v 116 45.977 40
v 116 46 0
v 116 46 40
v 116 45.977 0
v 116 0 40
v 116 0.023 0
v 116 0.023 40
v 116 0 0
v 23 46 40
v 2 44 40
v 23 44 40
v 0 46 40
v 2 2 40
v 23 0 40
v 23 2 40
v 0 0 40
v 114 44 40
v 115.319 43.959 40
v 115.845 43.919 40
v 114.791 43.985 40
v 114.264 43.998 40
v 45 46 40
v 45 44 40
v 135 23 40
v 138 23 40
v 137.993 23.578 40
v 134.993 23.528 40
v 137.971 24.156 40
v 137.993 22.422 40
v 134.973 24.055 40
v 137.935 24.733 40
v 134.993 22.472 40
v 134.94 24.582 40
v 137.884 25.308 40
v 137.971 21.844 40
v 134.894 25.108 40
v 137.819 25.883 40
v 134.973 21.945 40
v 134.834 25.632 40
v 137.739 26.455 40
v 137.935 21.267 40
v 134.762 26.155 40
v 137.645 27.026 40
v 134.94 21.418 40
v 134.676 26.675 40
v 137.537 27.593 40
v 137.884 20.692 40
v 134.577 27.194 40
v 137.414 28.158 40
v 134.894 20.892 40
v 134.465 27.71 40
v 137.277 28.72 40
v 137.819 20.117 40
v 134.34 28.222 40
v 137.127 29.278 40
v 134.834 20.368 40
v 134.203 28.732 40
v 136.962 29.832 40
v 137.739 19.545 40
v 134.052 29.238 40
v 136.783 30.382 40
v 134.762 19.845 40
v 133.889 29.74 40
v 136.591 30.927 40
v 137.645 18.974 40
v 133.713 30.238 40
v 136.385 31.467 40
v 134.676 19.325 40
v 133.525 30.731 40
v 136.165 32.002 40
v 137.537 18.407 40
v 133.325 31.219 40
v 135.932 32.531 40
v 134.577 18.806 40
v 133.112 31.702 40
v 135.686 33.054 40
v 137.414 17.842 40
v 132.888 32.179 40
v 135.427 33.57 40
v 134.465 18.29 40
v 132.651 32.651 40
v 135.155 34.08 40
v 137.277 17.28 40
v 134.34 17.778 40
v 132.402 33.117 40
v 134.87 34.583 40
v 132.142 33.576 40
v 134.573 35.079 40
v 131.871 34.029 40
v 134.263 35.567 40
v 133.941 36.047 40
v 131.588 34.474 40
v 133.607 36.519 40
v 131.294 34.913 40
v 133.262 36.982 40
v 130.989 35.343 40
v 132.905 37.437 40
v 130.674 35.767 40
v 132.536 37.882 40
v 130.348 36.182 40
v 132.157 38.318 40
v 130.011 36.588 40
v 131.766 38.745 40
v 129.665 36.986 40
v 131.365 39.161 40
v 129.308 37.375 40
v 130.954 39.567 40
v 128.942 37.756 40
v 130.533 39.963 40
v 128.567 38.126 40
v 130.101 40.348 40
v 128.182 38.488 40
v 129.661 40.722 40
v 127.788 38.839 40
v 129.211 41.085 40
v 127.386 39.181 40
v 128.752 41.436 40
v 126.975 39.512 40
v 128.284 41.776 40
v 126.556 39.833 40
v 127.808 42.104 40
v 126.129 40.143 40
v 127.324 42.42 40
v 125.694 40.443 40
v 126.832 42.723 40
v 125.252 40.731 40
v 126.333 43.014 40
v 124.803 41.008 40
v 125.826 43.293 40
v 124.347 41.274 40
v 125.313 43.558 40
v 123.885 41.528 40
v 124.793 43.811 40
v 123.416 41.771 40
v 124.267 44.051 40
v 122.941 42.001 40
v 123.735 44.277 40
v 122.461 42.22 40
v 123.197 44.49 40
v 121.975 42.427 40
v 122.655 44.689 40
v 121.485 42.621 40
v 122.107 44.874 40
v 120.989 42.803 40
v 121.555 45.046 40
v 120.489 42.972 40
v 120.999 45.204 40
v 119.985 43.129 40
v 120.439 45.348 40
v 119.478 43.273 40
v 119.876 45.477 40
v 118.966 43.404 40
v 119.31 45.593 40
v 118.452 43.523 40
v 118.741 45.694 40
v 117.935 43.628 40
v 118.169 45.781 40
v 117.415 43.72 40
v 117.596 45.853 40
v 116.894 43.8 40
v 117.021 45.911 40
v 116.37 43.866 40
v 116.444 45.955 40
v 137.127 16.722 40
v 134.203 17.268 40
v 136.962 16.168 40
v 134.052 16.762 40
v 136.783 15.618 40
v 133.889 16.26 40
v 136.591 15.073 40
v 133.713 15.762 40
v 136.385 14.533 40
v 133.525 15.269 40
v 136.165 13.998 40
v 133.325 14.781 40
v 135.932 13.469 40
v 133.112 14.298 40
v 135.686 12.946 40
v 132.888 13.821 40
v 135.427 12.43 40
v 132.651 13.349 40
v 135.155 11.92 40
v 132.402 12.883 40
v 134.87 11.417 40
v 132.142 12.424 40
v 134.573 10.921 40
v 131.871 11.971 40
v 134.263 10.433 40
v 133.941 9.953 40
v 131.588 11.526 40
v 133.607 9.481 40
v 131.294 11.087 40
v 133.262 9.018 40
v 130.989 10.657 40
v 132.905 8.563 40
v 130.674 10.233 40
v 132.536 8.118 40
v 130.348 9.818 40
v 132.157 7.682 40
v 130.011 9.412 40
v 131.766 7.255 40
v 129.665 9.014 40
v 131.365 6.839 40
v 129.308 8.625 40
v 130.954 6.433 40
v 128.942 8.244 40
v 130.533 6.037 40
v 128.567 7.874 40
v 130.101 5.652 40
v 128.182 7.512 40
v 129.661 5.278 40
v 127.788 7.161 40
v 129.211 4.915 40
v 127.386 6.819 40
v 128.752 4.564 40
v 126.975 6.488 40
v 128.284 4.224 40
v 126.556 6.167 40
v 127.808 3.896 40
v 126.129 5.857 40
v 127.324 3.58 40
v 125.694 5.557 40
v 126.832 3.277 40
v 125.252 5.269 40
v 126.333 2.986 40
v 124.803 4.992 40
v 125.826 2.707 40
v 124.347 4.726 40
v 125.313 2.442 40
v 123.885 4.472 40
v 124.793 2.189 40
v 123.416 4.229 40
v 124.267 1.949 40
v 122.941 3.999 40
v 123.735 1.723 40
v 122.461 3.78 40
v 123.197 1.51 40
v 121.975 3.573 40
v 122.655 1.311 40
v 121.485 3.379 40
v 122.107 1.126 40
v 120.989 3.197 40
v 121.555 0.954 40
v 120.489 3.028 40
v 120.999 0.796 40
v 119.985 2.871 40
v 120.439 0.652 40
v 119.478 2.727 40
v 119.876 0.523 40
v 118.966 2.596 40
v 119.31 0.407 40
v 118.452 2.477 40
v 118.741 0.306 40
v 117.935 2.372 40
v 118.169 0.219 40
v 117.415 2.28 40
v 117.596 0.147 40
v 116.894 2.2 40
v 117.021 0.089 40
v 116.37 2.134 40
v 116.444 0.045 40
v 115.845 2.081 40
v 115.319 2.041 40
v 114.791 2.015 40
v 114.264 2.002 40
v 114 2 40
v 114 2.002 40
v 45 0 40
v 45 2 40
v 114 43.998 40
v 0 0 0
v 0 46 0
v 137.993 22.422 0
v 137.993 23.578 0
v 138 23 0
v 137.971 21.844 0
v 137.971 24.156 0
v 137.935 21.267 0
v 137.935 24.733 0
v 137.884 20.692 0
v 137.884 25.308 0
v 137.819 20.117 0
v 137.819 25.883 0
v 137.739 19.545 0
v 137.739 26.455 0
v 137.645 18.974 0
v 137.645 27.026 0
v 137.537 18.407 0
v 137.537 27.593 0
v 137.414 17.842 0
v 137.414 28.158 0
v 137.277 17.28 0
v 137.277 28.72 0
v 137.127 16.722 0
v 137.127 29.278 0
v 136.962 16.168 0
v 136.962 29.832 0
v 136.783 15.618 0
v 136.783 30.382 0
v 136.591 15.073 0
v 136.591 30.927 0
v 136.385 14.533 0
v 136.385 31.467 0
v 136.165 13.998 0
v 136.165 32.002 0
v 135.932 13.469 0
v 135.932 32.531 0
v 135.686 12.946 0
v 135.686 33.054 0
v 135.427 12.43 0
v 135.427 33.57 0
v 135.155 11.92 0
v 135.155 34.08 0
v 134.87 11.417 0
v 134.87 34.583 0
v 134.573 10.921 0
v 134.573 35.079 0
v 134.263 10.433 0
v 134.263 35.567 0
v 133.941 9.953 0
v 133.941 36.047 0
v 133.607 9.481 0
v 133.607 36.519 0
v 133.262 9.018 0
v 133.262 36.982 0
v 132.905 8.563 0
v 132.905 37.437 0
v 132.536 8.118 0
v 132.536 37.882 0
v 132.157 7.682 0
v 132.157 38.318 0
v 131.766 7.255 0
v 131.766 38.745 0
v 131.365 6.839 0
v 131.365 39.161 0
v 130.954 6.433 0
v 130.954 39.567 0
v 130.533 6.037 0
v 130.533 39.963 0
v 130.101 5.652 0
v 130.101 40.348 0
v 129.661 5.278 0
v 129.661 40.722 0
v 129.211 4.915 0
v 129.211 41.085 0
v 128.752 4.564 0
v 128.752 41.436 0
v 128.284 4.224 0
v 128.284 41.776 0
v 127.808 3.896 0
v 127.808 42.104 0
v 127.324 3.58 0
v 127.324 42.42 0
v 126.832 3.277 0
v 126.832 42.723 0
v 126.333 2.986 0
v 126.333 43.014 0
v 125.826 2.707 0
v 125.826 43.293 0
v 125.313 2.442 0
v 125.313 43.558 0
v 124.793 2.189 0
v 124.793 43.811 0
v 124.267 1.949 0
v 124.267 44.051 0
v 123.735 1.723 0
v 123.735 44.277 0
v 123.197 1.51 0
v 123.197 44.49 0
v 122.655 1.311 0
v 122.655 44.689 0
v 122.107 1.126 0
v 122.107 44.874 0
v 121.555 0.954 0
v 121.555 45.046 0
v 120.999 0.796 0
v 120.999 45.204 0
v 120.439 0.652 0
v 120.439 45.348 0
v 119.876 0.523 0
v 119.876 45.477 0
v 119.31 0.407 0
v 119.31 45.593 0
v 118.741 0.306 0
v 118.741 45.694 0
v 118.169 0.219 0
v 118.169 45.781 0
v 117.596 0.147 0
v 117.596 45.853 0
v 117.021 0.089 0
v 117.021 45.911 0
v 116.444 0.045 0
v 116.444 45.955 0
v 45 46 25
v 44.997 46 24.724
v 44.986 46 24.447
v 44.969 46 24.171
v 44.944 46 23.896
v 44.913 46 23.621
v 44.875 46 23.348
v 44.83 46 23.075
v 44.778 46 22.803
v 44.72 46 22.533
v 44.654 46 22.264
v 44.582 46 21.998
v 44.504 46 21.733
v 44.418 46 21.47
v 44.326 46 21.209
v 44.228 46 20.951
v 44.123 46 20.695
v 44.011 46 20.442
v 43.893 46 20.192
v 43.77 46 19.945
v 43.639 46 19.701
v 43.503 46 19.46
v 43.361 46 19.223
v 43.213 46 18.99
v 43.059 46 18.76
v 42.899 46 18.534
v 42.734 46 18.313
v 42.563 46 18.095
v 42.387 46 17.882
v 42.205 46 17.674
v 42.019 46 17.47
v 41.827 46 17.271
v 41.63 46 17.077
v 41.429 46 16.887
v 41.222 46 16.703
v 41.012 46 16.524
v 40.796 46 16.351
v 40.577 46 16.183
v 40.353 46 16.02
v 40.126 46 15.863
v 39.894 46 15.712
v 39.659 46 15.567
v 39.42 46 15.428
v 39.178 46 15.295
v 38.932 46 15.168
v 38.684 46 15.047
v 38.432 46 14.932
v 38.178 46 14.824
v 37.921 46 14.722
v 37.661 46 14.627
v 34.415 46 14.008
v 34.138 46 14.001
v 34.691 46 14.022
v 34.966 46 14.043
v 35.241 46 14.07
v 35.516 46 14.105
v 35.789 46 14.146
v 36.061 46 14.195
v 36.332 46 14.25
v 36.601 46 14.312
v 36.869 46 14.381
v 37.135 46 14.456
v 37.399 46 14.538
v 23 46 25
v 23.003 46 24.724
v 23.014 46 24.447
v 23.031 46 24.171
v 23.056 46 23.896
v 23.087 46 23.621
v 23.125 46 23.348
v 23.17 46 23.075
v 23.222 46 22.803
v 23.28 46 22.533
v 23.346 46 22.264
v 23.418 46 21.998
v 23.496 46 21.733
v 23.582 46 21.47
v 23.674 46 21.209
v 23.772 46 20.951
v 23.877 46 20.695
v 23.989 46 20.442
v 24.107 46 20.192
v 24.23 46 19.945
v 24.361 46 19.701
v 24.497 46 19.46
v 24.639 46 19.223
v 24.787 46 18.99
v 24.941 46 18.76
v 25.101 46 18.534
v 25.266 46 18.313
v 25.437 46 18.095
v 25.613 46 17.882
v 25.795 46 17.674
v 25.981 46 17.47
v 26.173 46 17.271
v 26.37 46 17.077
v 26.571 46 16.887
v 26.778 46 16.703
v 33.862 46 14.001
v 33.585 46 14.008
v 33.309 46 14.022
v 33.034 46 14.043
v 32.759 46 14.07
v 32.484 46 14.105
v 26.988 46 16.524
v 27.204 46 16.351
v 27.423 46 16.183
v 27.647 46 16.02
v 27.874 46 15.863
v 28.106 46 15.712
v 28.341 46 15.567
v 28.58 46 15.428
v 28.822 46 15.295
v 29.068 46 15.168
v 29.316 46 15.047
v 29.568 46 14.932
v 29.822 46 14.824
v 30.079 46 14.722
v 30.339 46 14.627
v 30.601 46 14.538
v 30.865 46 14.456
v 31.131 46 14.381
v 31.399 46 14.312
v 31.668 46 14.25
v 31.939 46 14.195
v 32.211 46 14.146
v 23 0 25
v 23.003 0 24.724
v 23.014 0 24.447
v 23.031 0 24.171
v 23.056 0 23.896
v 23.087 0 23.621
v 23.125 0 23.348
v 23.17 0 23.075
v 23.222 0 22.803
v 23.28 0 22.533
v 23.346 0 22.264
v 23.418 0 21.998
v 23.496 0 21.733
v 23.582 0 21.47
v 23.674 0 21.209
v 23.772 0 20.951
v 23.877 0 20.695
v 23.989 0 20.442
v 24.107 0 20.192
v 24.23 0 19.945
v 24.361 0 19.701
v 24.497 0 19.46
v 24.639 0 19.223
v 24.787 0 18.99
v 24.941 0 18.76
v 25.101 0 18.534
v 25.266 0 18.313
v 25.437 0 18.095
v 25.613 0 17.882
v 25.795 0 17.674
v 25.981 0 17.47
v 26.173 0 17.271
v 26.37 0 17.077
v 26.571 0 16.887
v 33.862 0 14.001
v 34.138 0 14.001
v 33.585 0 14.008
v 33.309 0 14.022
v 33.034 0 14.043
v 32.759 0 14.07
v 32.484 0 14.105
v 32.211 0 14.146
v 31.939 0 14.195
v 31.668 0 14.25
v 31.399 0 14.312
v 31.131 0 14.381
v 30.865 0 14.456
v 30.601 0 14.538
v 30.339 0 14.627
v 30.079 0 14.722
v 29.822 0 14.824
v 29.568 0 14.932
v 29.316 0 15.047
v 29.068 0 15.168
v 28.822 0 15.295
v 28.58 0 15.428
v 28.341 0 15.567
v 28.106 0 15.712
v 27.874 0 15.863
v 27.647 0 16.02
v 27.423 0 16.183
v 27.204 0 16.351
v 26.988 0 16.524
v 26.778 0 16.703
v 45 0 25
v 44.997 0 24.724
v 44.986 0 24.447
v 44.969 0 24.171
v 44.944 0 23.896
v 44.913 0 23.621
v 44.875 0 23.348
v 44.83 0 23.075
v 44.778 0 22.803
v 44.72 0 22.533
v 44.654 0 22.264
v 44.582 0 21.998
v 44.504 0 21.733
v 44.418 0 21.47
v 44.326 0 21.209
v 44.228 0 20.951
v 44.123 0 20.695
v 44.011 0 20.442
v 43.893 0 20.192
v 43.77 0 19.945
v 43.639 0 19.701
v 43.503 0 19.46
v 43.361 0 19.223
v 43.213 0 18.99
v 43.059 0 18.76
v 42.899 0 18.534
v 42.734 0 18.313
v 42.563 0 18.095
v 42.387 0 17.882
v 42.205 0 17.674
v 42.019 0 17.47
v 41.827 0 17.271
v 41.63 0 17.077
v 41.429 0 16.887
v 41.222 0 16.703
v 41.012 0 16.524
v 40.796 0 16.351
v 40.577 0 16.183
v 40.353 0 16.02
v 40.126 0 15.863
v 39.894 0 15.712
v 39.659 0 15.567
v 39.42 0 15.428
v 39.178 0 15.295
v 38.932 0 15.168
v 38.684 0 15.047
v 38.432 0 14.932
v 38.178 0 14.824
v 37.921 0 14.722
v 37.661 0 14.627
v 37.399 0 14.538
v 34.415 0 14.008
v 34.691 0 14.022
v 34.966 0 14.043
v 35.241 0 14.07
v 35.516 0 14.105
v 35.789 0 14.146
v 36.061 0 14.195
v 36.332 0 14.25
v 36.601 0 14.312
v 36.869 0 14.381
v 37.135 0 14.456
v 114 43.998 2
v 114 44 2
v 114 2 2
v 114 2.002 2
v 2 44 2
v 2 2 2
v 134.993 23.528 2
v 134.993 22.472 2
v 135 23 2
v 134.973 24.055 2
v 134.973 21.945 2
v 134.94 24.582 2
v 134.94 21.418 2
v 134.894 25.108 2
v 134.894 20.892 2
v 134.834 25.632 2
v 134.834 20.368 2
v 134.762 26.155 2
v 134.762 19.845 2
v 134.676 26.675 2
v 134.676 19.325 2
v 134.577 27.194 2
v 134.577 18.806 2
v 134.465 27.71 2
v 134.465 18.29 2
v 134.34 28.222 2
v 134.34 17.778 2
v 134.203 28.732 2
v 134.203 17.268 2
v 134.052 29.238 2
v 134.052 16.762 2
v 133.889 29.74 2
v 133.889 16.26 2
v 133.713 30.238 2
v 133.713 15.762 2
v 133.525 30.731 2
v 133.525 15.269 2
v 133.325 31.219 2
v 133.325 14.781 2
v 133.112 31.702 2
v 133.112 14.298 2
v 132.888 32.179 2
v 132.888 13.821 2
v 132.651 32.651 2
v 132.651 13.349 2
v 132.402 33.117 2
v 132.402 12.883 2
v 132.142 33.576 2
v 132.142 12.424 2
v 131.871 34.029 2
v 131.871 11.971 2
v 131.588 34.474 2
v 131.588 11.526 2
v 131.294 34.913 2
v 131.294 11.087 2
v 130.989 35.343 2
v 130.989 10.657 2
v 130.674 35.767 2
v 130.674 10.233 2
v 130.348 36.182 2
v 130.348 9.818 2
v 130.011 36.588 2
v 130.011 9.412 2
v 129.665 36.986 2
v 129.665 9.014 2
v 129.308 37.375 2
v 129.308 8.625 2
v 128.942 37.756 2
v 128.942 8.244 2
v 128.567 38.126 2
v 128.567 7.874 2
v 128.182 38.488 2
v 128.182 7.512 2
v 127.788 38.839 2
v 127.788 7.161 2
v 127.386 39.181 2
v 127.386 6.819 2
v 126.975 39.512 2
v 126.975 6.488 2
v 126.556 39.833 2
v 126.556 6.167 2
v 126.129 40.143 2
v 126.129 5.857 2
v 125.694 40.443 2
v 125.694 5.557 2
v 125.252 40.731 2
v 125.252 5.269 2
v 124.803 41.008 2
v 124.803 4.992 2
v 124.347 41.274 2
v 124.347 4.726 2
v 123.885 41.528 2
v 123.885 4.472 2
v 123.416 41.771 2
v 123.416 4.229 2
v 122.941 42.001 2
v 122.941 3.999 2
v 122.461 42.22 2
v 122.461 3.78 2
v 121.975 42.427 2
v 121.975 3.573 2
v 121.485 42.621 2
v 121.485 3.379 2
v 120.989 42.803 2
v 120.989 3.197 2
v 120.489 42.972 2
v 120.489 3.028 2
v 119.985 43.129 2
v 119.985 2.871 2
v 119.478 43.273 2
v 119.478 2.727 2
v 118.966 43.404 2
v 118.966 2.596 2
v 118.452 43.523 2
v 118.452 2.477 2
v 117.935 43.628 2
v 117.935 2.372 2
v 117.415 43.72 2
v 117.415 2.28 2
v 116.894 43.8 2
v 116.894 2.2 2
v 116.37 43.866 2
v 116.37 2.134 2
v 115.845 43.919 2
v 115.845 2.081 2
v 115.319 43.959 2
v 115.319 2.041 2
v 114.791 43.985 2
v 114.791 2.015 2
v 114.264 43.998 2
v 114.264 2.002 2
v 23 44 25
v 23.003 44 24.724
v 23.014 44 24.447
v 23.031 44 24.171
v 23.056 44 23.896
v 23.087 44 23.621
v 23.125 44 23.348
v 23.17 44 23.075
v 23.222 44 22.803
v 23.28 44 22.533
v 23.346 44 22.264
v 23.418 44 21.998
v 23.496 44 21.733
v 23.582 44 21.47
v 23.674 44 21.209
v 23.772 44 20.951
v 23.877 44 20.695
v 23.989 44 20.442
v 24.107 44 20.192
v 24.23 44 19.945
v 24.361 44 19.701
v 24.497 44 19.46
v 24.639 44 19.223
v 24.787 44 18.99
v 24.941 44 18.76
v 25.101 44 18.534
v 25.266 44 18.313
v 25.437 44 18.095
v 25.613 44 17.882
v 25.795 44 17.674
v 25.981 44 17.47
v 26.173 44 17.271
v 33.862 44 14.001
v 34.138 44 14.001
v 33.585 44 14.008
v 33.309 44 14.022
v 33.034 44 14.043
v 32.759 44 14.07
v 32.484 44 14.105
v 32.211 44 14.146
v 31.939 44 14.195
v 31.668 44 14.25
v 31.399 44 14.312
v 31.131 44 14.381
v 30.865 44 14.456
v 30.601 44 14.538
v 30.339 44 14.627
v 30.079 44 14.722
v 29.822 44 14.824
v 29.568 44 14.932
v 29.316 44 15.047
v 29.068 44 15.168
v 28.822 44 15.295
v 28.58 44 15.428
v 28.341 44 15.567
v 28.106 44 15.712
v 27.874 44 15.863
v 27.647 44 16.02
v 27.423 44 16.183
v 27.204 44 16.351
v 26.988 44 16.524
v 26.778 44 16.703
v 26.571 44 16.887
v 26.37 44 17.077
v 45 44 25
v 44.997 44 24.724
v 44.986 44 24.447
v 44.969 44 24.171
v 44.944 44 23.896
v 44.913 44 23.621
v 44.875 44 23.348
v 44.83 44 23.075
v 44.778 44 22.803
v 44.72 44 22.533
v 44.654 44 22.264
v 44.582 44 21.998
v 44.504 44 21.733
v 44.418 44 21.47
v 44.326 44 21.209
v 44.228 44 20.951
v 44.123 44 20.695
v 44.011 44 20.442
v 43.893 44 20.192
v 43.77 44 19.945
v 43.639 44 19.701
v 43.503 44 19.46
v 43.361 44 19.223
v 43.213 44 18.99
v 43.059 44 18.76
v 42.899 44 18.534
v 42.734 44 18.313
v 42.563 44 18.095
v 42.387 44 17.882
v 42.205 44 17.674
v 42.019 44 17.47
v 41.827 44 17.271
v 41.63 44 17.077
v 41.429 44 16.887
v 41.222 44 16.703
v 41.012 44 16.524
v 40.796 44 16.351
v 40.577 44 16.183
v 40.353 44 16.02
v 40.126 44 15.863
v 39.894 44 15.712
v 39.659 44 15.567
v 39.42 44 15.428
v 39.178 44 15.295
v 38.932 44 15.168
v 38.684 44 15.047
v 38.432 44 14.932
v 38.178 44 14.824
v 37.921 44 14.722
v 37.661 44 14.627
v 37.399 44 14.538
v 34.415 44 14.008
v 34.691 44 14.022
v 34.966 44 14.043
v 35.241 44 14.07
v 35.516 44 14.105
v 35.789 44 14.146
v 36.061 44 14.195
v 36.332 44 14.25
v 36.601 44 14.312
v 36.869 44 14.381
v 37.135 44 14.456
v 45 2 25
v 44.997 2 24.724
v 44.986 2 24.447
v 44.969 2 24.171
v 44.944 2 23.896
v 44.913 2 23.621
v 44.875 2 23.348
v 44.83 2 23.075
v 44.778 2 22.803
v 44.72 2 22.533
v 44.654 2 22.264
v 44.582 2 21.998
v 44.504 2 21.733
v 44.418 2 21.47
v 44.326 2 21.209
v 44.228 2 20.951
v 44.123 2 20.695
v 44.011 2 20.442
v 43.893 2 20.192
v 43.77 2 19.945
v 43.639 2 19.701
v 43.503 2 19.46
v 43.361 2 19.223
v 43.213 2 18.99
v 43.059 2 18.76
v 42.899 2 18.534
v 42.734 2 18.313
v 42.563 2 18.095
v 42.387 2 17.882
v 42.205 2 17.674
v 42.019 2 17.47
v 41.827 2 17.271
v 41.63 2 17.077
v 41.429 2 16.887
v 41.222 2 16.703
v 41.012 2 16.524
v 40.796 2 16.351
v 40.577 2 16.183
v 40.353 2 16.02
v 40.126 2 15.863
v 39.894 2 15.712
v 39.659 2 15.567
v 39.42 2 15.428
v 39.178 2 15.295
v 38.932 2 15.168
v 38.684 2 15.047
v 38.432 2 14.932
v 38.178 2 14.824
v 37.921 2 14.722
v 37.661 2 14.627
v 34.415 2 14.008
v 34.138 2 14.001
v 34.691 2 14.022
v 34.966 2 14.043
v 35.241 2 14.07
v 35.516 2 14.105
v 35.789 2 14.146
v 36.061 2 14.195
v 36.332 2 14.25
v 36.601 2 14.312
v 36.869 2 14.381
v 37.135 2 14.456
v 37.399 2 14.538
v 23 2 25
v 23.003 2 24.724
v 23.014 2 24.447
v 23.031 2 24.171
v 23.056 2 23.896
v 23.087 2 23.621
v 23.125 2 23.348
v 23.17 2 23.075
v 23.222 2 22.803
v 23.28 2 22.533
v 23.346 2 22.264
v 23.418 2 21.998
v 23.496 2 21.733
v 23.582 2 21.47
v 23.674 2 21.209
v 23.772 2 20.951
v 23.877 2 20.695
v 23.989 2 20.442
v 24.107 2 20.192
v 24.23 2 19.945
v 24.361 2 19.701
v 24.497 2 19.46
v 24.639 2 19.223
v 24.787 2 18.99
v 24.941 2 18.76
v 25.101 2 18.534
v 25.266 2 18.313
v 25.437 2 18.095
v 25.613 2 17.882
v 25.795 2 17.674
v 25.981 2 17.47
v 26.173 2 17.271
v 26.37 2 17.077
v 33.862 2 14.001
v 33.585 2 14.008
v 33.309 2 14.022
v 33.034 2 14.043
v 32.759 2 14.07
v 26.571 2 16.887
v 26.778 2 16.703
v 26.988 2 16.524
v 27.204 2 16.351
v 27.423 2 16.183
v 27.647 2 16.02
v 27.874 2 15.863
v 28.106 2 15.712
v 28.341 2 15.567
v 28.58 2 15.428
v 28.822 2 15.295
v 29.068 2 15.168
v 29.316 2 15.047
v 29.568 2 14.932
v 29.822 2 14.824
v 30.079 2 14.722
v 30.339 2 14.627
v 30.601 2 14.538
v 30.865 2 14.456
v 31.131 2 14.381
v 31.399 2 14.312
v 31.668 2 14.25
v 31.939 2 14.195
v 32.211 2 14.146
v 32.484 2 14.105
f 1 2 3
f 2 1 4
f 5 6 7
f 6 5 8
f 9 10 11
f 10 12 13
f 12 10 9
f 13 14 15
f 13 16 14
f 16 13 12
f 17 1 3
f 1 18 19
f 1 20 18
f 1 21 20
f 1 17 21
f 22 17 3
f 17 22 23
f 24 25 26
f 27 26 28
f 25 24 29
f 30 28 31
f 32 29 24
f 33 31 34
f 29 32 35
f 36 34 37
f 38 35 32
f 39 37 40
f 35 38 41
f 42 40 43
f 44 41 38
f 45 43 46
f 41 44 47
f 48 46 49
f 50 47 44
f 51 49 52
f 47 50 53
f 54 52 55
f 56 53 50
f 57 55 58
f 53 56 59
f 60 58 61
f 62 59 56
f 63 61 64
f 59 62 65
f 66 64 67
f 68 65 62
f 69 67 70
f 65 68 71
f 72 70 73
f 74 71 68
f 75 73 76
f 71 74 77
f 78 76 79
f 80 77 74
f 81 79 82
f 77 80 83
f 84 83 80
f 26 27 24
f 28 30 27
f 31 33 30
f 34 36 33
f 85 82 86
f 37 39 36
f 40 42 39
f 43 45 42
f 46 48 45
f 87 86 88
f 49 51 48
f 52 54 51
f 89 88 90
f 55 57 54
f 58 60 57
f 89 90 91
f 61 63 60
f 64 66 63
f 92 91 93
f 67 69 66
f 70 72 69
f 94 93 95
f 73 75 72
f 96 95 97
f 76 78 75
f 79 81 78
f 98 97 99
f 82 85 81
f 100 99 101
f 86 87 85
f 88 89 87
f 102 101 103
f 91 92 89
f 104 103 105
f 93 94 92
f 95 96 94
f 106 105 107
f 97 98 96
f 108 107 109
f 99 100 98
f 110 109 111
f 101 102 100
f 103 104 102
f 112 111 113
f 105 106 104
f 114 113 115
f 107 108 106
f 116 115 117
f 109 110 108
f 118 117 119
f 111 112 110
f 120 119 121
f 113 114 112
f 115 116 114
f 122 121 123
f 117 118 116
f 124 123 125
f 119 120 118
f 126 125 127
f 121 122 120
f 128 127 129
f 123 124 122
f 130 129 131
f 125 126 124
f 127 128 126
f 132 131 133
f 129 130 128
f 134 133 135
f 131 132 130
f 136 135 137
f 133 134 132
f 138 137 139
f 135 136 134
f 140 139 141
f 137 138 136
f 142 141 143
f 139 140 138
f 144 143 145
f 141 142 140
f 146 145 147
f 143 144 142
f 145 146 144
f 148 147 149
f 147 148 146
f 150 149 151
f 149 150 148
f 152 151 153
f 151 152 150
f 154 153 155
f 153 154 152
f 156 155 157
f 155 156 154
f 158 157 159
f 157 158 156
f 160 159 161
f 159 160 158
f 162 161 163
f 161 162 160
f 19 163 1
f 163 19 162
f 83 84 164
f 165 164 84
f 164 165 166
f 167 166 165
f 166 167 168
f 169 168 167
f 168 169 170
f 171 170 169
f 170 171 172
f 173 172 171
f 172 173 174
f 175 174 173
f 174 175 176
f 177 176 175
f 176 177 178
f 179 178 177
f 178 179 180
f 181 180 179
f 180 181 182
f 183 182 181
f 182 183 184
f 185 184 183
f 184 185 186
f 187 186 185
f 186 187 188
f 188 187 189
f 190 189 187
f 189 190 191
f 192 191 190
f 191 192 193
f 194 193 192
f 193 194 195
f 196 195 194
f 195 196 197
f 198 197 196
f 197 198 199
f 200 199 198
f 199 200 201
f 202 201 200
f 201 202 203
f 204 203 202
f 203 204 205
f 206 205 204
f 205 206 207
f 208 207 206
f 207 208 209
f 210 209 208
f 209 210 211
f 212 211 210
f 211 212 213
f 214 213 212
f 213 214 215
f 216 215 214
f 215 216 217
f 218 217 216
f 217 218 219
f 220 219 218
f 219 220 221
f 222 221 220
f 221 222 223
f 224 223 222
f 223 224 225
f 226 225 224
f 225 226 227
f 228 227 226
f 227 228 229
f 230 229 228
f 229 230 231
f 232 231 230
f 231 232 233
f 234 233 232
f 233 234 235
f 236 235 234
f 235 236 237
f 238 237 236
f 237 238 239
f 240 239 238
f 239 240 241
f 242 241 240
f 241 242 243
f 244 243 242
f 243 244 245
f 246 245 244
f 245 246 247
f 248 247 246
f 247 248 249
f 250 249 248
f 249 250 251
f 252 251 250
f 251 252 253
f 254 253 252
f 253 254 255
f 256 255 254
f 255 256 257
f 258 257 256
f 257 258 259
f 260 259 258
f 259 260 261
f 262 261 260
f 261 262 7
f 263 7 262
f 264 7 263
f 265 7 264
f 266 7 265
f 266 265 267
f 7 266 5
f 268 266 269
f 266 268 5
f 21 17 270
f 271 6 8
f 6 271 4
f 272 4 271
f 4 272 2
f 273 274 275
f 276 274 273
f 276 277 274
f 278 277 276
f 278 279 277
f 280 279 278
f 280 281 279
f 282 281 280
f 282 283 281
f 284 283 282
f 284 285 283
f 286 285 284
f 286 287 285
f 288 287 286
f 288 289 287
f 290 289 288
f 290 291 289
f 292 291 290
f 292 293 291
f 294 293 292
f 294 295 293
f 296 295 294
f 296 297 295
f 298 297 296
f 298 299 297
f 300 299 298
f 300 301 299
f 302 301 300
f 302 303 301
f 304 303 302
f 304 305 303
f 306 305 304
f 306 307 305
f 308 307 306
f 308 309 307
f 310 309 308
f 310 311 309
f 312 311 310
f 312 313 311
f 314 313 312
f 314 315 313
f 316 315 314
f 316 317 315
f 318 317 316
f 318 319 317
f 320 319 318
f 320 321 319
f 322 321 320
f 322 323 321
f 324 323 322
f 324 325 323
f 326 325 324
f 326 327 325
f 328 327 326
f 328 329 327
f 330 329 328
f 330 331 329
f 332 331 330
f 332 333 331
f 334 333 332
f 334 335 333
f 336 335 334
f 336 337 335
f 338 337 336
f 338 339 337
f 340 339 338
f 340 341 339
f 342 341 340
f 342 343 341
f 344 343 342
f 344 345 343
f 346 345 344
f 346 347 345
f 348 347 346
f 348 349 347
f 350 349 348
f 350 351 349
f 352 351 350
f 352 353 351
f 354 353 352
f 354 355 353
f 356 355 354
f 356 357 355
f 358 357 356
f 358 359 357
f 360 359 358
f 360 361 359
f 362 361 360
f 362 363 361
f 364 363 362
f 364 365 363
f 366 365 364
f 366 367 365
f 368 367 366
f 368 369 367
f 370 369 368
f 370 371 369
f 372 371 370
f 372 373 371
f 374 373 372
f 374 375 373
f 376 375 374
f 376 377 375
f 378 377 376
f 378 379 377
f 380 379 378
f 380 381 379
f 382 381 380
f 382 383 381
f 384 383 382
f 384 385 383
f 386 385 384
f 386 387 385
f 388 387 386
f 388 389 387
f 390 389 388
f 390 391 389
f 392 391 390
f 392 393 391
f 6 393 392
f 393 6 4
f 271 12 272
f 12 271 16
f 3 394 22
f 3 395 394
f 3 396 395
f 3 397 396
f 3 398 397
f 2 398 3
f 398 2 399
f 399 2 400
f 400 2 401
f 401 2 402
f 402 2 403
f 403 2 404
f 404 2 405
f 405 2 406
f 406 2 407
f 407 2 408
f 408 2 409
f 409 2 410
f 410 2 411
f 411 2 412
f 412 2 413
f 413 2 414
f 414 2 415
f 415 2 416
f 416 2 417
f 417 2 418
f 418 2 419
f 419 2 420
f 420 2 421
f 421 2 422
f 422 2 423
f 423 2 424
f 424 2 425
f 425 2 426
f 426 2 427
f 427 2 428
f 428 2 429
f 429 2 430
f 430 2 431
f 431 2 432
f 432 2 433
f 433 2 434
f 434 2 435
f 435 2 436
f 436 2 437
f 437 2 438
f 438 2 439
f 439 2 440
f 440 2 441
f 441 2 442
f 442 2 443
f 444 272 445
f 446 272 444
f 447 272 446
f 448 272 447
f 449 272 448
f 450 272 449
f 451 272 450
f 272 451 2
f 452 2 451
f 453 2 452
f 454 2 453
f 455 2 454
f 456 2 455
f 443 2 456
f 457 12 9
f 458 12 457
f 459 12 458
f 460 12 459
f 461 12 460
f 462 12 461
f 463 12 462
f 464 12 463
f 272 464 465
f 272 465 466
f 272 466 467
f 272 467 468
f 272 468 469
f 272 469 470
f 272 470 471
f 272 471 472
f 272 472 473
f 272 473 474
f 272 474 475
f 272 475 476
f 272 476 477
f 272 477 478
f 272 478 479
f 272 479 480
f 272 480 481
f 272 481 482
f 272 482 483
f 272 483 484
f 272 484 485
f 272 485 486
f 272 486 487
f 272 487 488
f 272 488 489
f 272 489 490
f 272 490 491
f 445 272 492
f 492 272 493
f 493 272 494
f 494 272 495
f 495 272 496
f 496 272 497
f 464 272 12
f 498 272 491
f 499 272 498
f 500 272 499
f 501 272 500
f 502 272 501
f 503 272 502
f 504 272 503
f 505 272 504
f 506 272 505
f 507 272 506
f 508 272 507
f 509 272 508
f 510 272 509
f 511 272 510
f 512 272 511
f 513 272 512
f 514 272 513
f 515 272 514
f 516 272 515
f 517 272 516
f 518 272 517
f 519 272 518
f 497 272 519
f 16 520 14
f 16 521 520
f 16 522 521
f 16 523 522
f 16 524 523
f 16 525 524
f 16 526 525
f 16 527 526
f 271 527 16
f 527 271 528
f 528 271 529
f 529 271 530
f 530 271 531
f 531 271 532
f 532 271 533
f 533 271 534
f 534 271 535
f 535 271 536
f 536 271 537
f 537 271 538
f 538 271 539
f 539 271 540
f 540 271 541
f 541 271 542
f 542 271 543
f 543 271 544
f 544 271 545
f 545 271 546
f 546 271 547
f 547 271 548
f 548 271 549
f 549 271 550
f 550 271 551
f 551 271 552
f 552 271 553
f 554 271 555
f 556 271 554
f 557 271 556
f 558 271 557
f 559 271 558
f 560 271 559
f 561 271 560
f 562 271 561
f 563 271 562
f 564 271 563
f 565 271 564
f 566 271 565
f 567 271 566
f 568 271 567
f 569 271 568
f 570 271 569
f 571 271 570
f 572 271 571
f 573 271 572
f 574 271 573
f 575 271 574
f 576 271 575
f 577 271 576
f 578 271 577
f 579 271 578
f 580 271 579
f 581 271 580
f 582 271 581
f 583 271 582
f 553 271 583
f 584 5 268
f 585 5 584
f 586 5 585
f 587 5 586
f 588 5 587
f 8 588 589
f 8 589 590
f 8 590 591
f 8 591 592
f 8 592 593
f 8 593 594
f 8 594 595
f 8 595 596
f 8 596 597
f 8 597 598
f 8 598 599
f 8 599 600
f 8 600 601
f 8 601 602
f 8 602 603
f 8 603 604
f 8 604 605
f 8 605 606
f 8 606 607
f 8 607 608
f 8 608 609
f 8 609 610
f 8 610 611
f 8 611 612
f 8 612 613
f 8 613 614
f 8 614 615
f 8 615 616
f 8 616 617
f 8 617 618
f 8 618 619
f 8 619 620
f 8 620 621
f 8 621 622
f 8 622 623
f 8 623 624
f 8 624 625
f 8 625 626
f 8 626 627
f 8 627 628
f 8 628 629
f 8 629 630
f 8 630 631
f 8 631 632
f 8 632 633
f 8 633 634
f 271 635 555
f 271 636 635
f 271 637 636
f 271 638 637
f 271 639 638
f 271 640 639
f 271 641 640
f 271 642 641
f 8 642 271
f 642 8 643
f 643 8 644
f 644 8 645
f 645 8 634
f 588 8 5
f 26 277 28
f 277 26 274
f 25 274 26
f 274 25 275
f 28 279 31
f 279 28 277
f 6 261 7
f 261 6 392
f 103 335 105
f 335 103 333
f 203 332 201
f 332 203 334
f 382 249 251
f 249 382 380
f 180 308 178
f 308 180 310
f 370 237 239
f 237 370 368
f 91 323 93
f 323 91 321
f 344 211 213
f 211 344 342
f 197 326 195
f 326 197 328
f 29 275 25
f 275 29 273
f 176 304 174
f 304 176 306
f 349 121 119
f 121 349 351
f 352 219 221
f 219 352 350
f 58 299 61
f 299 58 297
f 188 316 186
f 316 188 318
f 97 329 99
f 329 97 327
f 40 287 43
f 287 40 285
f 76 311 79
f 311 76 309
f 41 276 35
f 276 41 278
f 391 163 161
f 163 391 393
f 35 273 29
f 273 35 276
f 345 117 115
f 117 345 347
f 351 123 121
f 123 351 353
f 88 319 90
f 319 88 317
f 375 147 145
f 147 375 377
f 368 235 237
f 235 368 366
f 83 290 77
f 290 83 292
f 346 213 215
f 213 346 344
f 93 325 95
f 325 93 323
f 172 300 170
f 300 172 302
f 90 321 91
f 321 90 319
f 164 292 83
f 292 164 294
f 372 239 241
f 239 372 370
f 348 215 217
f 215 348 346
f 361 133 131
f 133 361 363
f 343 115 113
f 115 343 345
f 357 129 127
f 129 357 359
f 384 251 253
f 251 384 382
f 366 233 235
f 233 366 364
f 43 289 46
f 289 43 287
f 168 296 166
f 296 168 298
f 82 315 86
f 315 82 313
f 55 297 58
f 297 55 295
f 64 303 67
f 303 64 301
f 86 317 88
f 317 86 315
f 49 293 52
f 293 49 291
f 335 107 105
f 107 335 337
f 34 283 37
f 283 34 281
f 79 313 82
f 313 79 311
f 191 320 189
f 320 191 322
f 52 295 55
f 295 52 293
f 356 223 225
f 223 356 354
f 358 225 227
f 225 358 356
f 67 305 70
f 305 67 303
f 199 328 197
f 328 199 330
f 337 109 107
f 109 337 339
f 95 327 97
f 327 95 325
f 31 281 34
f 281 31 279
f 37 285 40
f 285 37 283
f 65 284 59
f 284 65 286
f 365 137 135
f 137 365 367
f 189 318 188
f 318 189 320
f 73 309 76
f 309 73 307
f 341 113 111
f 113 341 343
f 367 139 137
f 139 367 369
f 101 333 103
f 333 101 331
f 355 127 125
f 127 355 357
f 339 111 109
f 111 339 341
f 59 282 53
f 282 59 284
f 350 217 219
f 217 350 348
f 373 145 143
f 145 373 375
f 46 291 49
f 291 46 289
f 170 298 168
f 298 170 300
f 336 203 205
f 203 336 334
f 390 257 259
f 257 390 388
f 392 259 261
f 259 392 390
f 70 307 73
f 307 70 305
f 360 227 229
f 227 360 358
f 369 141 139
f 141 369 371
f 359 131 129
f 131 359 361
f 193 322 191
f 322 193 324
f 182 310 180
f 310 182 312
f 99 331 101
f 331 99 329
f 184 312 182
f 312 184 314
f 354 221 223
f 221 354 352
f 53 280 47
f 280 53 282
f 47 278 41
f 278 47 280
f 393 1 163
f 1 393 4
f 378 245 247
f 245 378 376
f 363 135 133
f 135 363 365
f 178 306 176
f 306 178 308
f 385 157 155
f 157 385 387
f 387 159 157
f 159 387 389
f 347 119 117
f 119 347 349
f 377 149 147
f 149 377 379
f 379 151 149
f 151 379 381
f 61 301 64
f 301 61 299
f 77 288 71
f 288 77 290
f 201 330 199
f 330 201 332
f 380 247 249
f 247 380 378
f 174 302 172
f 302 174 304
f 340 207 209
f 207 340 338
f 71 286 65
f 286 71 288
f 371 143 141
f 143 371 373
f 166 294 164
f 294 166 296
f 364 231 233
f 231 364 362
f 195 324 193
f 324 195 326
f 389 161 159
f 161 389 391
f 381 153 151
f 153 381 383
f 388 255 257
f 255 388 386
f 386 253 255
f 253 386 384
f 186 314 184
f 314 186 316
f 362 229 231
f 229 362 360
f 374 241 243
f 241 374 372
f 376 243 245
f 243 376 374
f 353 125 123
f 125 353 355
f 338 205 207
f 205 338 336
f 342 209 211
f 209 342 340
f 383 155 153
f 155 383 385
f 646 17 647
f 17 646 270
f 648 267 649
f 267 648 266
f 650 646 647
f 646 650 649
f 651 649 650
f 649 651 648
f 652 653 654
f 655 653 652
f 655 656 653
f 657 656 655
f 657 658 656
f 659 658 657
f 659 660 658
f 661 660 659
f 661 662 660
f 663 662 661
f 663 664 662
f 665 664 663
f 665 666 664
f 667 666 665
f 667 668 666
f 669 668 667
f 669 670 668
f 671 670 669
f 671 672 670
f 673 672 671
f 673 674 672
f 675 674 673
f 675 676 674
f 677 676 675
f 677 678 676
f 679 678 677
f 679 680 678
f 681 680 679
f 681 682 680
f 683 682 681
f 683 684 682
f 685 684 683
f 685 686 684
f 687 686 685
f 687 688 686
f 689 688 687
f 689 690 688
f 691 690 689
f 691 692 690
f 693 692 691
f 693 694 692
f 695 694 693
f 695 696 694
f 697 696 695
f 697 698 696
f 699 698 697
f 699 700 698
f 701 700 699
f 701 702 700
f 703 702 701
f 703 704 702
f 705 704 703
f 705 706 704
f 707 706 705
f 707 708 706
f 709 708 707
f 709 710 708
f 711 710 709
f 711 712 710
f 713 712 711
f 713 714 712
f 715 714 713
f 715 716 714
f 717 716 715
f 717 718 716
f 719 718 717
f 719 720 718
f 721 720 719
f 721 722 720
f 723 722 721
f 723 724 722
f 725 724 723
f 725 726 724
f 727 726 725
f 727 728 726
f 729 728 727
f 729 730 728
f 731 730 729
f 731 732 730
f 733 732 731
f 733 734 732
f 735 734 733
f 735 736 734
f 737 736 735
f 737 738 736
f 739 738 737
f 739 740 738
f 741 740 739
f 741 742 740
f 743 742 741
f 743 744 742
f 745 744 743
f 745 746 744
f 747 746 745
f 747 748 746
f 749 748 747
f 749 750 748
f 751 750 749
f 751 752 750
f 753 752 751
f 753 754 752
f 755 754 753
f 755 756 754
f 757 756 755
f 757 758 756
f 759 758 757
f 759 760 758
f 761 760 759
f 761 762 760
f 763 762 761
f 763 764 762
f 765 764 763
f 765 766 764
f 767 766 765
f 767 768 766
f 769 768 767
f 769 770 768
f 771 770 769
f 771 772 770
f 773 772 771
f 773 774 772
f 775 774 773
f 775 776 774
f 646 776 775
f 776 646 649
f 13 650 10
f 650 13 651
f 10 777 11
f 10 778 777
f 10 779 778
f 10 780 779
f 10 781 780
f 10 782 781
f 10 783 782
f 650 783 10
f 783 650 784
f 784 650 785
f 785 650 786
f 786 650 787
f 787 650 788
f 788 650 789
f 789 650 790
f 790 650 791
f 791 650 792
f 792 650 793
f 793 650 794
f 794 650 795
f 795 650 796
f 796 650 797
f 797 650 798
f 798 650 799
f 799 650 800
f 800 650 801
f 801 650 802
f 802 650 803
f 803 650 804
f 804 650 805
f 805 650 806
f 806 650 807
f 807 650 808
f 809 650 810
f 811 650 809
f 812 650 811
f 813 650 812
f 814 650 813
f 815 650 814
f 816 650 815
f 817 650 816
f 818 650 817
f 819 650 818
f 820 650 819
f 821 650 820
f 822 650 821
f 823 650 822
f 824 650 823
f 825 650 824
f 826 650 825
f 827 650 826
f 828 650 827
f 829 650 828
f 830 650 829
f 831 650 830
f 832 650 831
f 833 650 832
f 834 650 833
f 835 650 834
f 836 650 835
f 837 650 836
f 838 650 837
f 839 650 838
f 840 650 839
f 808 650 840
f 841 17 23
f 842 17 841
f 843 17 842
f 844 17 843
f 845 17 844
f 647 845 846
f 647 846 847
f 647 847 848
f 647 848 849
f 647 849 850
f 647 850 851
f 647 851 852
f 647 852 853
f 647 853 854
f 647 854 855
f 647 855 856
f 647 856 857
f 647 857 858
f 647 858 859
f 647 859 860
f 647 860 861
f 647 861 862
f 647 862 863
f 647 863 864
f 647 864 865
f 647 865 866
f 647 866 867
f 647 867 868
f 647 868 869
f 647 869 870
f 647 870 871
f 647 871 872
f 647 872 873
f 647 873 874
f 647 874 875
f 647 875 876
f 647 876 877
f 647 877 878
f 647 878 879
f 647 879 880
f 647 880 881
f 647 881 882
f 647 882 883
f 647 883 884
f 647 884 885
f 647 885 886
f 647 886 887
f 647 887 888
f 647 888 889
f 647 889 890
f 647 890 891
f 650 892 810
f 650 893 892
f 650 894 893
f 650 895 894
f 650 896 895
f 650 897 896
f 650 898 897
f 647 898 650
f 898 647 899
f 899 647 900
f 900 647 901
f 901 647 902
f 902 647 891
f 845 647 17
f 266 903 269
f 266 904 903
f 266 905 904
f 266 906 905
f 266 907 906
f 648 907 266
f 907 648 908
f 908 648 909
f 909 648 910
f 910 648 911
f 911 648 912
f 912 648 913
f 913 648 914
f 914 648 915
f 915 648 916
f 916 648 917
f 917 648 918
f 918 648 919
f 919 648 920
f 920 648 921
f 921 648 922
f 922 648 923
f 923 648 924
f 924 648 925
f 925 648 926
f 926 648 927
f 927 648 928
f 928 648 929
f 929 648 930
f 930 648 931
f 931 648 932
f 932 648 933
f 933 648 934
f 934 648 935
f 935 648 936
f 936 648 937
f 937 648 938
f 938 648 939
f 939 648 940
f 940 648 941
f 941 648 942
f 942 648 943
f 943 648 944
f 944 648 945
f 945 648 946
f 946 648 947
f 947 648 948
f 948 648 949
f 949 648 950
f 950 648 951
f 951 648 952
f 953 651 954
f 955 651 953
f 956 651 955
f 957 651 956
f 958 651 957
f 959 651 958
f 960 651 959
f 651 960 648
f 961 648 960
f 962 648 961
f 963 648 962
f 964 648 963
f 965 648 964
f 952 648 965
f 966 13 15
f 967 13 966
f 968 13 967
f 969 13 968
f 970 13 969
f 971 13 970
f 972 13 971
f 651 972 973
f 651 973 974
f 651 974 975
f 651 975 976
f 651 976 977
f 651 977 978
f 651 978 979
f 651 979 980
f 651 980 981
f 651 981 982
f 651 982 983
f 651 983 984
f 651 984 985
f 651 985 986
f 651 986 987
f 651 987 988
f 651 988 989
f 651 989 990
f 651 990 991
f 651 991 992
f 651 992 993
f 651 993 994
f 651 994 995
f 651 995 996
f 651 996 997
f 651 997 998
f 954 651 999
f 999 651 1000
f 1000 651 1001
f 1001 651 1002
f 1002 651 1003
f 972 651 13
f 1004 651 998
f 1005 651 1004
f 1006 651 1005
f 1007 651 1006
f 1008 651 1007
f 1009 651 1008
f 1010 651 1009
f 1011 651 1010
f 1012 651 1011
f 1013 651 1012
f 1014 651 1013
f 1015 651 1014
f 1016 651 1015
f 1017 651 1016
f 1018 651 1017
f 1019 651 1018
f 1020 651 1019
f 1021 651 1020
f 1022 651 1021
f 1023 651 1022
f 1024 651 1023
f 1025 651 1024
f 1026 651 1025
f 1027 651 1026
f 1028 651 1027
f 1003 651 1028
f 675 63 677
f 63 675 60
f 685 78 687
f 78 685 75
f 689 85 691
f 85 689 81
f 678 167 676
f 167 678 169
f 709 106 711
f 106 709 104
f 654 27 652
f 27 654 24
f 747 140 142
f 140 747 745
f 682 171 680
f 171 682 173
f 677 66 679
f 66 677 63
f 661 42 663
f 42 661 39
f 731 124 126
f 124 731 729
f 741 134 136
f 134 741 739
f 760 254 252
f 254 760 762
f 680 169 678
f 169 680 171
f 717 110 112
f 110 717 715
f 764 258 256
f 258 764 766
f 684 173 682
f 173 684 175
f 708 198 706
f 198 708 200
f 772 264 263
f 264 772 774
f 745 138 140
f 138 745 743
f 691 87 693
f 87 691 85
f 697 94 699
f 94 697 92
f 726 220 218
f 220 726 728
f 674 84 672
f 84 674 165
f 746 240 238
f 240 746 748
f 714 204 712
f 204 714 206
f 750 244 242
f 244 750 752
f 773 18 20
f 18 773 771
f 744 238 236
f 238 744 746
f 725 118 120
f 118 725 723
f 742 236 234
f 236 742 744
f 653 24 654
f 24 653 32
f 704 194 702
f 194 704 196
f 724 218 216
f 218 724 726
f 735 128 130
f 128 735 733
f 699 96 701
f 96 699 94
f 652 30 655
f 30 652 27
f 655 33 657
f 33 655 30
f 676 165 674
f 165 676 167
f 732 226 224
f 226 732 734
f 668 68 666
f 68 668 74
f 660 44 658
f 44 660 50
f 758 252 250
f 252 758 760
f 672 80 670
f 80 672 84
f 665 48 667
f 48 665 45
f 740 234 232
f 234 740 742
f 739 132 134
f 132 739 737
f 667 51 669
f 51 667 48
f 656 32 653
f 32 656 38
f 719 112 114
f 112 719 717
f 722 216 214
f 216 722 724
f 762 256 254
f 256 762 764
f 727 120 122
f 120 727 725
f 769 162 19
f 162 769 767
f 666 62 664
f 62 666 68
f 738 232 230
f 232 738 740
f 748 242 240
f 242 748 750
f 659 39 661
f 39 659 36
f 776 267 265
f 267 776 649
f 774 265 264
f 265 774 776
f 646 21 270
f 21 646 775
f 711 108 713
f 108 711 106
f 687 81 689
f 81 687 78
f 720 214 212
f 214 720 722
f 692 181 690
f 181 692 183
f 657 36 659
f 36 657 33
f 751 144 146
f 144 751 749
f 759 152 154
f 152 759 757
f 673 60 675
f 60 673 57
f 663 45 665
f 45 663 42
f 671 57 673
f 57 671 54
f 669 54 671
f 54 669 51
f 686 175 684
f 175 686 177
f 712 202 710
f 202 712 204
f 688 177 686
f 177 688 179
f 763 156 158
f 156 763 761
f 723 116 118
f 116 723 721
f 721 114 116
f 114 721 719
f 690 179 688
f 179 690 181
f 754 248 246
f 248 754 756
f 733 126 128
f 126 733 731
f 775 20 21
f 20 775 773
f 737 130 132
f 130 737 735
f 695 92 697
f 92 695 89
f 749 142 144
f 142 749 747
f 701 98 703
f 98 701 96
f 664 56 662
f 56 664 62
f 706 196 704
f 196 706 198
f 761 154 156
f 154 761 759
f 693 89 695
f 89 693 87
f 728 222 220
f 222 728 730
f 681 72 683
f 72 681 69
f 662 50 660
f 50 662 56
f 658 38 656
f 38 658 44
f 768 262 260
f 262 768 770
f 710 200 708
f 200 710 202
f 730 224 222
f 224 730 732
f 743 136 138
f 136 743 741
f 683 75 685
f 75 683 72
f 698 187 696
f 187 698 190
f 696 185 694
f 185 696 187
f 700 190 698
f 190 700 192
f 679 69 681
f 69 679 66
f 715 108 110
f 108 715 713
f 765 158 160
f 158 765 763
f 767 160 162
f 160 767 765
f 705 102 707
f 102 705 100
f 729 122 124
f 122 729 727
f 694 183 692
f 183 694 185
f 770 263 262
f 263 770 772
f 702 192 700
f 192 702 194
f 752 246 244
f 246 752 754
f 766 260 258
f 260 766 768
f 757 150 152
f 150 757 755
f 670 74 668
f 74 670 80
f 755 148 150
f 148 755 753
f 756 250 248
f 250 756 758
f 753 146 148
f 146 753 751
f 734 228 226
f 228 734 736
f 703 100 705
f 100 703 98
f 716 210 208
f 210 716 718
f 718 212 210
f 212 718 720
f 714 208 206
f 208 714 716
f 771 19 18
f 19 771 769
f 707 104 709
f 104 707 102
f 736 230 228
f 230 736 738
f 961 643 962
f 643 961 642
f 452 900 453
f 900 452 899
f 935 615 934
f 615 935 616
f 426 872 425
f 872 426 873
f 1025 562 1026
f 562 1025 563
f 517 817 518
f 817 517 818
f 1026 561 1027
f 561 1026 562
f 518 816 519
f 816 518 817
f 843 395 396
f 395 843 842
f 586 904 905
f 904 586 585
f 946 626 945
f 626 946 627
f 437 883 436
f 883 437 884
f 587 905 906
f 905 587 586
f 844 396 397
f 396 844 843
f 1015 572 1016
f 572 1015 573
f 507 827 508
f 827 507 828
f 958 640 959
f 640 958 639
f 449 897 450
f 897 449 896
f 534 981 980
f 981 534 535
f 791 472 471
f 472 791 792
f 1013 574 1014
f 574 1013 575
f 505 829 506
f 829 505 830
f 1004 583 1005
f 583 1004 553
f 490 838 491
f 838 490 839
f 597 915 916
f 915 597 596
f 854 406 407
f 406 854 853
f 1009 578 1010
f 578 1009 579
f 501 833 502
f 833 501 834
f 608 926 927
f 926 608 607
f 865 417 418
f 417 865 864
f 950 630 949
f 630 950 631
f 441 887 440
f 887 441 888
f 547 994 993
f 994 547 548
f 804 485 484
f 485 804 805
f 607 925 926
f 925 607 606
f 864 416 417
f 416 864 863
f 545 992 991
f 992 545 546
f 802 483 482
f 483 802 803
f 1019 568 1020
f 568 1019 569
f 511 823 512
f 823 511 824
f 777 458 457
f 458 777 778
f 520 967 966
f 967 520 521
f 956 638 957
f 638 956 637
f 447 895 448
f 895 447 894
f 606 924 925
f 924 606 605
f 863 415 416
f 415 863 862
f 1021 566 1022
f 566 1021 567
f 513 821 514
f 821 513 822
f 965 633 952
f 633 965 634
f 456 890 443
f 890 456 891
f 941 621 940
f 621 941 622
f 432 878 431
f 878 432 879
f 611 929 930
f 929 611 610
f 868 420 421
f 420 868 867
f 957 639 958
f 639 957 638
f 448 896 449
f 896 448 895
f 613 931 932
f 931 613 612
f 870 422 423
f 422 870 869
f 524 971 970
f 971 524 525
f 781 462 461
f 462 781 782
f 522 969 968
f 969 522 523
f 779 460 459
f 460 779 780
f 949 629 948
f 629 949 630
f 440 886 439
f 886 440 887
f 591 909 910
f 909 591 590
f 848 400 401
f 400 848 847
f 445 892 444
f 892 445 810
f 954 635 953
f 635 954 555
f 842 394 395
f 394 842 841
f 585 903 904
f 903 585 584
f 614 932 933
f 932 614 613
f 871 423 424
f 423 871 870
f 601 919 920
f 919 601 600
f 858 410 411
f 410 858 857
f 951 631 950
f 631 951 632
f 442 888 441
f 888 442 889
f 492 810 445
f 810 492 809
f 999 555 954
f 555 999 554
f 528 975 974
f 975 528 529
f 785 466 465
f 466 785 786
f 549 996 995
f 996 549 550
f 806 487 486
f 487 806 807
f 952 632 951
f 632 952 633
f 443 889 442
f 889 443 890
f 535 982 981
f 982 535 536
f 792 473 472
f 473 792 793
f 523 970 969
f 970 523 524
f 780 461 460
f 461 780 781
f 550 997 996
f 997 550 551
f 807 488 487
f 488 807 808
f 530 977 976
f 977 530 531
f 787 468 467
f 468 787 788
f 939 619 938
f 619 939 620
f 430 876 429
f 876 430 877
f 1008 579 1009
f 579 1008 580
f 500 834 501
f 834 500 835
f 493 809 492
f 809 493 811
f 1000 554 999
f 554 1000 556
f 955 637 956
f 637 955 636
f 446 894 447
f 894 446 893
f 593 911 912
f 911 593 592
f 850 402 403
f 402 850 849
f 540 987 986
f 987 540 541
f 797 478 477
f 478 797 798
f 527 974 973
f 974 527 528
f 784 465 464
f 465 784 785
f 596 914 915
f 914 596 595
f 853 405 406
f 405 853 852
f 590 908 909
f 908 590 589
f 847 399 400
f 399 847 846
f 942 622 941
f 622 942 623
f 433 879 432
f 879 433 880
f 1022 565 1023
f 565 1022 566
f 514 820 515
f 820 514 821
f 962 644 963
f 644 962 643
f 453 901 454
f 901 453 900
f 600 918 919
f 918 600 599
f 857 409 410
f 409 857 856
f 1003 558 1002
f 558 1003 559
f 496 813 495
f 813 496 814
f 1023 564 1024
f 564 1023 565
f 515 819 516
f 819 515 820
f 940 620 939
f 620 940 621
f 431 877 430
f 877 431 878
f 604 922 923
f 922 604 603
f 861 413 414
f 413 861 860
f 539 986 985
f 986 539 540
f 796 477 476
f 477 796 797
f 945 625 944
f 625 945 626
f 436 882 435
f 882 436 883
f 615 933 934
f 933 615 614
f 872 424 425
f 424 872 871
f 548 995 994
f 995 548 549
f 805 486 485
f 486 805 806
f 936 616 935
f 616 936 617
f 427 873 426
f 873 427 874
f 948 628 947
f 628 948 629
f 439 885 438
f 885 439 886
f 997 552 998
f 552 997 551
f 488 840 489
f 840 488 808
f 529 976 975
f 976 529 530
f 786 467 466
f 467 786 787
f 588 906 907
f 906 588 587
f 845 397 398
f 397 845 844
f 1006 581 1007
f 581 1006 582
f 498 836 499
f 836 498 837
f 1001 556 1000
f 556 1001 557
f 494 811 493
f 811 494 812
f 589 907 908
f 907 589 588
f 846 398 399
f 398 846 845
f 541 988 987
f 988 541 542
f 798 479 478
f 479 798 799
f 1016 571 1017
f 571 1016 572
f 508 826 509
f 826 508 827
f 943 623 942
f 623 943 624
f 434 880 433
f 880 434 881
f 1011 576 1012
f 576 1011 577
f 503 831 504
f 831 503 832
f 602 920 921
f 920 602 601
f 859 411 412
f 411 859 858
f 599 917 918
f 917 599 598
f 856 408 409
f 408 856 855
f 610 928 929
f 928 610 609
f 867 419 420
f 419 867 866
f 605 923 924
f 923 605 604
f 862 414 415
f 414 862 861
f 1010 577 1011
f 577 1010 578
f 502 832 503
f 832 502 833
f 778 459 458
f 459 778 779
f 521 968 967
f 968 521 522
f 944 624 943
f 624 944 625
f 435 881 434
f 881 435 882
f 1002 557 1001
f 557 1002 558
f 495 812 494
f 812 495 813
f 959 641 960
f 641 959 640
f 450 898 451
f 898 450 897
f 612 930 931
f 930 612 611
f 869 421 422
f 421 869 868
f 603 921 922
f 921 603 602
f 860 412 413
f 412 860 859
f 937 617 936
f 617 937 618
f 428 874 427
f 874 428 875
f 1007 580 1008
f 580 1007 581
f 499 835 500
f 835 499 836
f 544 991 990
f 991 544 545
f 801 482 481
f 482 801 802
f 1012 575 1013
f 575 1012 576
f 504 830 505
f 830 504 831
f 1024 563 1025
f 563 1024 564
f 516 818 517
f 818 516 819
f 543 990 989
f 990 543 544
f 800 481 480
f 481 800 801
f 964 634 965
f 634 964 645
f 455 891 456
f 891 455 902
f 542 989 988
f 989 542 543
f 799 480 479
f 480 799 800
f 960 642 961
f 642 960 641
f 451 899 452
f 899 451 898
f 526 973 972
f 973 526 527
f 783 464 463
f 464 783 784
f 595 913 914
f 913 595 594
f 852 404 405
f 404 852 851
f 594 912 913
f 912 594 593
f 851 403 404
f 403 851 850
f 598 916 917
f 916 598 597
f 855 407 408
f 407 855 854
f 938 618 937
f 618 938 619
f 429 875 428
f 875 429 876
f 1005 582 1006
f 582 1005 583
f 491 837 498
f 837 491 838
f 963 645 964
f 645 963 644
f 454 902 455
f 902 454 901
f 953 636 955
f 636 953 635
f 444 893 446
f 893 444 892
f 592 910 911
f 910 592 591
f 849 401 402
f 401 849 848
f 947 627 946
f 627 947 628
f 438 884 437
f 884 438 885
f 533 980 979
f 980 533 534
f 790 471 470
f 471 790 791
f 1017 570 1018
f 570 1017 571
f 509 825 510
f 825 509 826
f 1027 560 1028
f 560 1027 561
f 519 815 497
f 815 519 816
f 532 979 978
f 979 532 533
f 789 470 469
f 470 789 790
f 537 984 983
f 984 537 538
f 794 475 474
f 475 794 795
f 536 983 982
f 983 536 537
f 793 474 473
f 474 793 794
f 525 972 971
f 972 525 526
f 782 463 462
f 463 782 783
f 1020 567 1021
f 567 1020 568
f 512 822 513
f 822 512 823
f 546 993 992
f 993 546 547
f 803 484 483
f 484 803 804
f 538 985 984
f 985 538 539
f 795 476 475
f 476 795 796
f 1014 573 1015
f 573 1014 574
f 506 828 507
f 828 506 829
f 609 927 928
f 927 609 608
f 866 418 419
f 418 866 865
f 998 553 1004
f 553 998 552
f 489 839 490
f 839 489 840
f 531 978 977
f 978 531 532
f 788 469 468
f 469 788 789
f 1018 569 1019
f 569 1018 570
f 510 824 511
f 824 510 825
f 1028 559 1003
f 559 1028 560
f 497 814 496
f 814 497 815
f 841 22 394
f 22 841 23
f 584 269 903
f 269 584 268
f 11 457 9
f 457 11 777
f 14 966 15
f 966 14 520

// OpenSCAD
$fn=250;


difference()
{
    translate([0,0,0]) 
        union()
        {
            cube([112+4,42+4,40]);
            translate([111+4,23,0]) cylinder(h=40,d=42+4);
        }
    translate([2,2,2]) 
        union()
        {
            cube([112,42,40]);
            translate([112,21,0]) cylinder(h=40,d=42);
        }
    translate([34,70,25])
    {
        rotate([90,0,0])
            cylinder(h=100,d=22);
        translate([-11,-100,0]) cube([22,100,200]);
    }
}
